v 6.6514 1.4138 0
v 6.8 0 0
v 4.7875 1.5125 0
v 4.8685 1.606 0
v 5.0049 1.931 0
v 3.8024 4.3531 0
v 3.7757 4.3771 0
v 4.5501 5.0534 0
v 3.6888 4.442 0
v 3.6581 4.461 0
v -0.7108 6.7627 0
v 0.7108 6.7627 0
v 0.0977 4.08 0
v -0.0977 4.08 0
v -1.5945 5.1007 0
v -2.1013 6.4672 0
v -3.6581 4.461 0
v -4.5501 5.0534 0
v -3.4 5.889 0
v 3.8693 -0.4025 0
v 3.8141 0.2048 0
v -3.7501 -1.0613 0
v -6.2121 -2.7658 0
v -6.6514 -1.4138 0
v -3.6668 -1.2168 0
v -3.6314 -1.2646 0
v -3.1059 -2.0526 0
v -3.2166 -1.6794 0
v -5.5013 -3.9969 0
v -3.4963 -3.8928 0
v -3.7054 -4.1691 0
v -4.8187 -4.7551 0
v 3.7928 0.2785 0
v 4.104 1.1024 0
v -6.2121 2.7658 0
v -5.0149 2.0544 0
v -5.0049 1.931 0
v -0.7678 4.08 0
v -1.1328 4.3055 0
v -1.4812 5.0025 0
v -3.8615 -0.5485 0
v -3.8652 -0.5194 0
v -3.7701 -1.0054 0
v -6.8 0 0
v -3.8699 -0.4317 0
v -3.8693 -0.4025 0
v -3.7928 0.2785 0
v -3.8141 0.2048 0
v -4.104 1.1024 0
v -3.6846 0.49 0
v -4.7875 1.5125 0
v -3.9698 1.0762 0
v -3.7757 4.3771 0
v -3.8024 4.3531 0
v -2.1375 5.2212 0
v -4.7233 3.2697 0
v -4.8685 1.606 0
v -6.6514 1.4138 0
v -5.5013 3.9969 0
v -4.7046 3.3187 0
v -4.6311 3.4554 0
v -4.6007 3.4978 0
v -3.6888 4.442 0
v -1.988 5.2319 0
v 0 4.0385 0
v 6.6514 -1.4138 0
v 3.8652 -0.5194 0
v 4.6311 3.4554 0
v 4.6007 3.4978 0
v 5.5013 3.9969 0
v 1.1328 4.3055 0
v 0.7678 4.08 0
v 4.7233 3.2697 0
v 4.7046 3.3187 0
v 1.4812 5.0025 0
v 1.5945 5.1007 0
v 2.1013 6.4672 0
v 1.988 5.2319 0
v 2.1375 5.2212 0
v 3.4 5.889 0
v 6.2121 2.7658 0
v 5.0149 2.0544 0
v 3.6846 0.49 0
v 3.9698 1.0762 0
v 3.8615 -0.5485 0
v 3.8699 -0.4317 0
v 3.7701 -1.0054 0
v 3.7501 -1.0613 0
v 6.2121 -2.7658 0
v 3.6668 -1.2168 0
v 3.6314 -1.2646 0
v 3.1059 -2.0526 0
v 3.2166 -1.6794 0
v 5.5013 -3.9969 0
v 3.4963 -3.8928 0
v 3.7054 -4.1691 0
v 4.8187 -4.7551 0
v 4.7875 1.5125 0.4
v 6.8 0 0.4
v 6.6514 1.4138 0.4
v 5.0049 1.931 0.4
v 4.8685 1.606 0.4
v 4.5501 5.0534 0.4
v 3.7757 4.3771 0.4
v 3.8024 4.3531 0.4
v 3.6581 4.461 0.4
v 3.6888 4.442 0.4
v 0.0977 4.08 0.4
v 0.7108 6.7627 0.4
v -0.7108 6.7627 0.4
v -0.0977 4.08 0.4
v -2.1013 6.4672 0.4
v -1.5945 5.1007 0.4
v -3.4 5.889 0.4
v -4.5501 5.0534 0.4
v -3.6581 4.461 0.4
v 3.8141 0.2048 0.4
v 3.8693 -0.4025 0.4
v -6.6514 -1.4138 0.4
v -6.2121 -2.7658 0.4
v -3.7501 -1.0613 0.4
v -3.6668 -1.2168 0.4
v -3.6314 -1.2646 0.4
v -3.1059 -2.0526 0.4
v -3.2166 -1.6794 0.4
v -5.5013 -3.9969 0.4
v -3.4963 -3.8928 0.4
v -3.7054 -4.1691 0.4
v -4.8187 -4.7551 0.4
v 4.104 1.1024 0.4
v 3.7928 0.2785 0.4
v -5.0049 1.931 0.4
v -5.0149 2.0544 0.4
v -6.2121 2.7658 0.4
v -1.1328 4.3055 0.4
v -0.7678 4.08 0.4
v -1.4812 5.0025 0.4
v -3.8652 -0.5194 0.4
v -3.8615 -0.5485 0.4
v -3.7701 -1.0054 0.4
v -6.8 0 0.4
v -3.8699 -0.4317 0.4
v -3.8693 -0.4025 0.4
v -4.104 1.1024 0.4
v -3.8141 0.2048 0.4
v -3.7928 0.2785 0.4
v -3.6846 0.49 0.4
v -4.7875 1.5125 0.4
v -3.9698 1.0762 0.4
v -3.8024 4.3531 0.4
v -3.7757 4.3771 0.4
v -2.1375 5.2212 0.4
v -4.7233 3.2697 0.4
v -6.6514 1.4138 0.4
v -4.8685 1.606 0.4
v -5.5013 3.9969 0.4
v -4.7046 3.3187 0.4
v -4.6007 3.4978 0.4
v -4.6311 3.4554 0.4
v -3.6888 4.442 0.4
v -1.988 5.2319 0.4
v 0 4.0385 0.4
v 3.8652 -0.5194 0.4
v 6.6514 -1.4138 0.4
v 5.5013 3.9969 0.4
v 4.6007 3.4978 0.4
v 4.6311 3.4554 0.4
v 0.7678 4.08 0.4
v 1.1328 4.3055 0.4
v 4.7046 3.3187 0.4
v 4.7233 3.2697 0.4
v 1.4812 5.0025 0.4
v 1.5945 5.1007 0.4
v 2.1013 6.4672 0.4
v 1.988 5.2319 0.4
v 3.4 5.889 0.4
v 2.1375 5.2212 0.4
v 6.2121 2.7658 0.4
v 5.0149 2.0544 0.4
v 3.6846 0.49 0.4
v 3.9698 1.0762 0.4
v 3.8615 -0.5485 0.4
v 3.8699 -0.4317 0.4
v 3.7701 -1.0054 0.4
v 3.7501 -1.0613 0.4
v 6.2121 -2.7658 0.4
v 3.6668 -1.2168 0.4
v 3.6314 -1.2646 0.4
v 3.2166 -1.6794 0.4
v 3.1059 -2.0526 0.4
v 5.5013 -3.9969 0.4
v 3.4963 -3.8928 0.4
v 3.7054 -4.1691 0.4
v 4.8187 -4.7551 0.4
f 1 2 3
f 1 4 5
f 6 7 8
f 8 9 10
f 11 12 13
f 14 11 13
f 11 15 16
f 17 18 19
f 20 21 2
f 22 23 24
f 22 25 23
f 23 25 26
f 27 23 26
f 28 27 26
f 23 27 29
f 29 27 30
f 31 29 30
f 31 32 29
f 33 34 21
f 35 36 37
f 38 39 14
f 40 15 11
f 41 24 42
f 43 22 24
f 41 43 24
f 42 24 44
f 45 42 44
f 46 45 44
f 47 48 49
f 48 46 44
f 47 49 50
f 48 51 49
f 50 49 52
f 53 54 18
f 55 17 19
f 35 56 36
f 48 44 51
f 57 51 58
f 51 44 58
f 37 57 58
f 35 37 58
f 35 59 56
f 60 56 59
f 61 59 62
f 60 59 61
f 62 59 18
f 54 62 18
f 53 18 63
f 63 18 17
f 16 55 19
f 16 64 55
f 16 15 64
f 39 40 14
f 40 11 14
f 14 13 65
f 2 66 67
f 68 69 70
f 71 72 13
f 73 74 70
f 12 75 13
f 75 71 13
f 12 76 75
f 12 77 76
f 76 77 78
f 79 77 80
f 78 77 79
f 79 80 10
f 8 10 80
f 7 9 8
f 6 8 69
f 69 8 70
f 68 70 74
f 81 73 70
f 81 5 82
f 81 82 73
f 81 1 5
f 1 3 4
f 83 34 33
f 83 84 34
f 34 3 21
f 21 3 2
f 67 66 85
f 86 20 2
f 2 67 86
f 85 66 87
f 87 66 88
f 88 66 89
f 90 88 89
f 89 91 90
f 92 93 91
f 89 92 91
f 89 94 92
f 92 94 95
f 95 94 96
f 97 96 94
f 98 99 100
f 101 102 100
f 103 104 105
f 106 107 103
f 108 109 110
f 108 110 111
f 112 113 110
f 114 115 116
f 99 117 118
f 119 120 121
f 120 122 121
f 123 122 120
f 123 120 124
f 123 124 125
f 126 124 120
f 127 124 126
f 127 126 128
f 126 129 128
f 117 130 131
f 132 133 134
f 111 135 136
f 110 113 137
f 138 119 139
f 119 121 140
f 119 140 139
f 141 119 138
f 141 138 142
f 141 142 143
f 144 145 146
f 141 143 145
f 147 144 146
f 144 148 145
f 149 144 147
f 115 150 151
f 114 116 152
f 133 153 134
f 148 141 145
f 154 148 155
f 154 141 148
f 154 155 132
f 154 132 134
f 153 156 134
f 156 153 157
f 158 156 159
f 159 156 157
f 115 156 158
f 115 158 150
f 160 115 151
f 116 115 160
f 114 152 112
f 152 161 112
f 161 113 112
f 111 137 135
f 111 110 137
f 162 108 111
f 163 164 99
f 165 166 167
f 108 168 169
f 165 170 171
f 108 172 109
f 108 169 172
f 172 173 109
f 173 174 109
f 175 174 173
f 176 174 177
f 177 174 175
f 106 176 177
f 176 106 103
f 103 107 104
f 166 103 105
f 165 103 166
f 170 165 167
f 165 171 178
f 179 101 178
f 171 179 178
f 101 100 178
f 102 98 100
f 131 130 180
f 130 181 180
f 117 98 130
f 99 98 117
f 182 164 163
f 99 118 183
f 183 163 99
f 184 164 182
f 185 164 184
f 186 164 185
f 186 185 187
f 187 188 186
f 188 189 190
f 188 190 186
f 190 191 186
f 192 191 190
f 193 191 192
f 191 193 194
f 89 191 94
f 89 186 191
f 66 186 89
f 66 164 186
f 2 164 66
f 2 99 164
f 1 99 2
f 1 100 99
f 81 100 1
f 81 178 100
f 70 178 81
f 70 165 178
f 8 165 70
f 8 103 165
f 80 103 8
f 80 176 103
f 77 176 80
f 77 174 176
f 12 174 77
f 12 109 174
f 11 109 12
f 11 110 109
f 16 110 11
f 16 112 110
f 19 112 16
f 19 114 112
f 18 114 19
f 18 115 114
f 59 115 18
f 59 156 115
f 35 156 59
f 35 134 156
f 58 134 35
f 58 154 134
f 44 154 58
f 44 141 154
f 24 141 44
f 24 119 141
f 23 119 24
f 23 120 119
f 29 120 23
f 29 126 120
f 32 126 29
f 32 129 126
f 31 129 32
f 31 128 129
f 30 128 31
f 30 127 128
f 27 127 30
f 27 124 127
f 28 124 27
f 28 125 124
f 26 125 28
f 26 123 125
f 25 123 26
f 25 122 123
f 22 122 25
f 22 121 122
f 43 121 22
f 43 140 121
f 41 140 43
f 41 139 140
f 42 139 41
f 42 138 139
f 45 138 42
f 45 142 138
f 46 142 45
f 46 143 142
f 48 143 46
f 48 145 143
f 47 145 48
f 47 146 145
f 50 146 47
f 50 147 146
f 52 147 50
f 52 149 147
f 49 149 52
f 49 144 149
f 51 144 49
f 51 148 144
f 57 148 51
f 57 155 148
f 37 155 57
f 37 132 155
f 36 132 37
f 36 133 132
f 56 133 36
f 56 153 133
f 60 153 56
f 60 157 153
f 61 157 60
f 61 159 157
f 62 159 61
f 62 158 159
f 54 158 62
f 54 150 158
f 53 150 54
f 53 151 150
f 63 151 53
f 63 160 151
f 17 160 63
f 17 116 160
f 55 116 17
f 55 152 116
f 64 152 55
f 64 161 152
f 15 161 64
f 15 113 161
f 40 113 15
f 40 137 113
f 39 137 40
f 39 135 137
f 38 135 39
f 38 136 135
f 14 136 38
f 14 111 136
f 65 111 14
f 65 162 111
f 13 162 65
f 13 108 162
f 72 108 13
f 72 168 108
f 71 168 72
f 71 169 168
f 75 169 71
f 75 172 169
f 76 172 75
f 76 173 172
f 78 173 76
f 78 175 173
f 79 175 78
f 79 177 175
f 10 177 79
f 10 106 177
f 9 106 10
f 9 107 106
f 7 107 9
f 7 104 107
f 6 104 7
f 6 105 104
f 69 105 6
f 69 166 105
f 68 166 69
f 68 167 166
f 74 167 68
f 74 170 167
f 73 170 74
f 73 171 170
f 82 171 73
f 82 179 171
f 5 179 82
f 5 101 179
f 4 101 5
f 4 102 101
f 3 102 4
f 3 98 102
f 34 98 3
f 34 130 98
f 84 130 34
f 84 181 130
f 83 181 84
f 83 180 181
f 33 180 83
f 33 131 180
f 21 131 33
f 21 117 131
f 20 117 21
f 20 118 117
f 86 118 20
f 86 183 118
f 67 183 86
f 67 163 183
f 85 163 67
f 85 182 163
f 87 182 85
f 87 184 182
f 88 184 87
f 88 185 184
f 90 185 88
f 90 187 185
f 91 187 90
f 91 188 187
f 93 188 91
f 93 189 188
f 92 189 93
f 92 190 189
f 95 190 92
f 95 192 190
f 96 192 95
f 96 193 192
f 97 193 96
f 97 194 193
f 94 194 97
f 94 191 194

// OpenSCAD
// file: ../lib/transforms.scad
use <functions.scad>

module fillet(r) {
  offset(r = -r) {
    offset(delta = r) {
      children();
    }
  }
}

// Generates the mirrored object in addition to the original one.
module mirror_copy(v = [1, 0, 0]) {
  children();
  mirror(v) {
    children();
  }
}

module translate_copy(v) {
  children();
  translate(v) {
    children();
  }
}

module rotate_copy(v) {
  children();
  translate(v) {
    children();
  }
}

module offset_3d(r=1, size=20, fn=12) {
  if (r == 0) {
    children();
  } else if (r > 0) {
    minkowski(convexity=5) {
      children();
      sphere(r, $fn=fn);
    }
  }
  else {
    size2 = size * [1, 1, 1];
    size1 = size2 * 2;

    difference() {
      cube(size2, center=true);
      minkowski(convexity=5) {
        difference() {
          cube(size1, center=true);
          children();
        }
        sphere(-r, $fn=fn);
      }
    }
  }
}

module offset_vertices_2d(r, fn) {
  offset(-r, $fn=fn) {
    offset(r, $fn=fn) {
      offset(r, $fn=fn) {
        offset(-r, $fn=fn) {
          children();
        }
      }
    }
  }
}

module four_corner_children(size=[10, 10],
                            center=true) {
  for (x_ind = [0, 1])
    for (y_ind = [0, 1]) {
      x_pos = (center ? -size[0] / 2 : 0) + x_ind * size[0];
      y_pos = (center ? -size[1] / 2 : 0) + y_ind * size[1];

      translate([x_pos, y_pos]) {
        $x_i = x_ind;
        $y_i = y_ind;
        children();
      }
    }
}

module four_corner_holes_2d(size=[10, 10],
                            center=false,
                            d=3,
                            fn=60) {
  for (x_ind = [0, 1])
    for (y_ind = [0, 1]) {
      x_pos = (center ? -size[0] / 2 : 0) + x_ind * size[0];
      y_pos = (center ? -size[1] / 2 : 0) + y_ind * size[1];
      translate([x_pos, y_pos]) {
        circle(r=d / 2, $fn=fn);
        children();
      }
    }
}

module maybe_rotate(rotation) {
  if (is_list(rotation) &&
      len([for (v = rotation) if (is_num(v)) v]) == 3 &&
      len([for (v = rotation) if (v != 0) v]) > 0) {
    rotate(rotation) {
      children();
    }
  } else {
    children();
  }
}

module maybe_translate(v) {
  if (is_list(v)
      && len([for (n = v) if (is_num(n)) n]) == 3
      && len([for (n = v) if (n != 0) n]) > 0) {
    translate(v) {
      children();
    }
  } else {
    children();
  }
}

module spin_keep_bbox_at_origin(size, a) {
  if (is_undef(a) || a == 0) {
    children();
  } else {
    p = calc_rotated_bbox(size[0], size[1], a);
    translate([p[2], p[3], 0]) {
      rotate([0, 0, a]) {
        children();
      }
    }
  }
}

module align_children(parent_size,
                      size,
                      align_x=-1,
                      align_y=-1) {
  if (!is_list(parent_size)
      || !is_num(parent_size[0])
      || !is_num(parent_size[1])) {
    children();
  } else {
    cell_x = parent_size[0];
    cell_y = parent_size[1];
    full_x = size[0];
    full_y = size[1];

    dx = cell_x - full_x;
    dy = cell_y - full_y;

    x = align_x == -1
      ? 0
      : align_x == 0
      ? dx / 2
      : dx;

    y = align_y == 0
      ? dy / 2
      : align_y == 1
      ? dy
      : 0;

    translate([x, y, 0]) {
      children();
    }
  }
}

/**
 ─────────────────────────────────────────────────────────────────────────────
 align_children_with_spin
 ─────────────────────────────────────────────────────────────────────────────

 **Example**:
 ```scad

 module example(angle=16,
                l=15,
                thickness=3,
                w=3) {
  bbox = rot_x_bbox_align([thickness, l, w,], angle=angle);
  bbox_y = bbox[0];
  bbox_z = bbox[1];

  #cube([bbox_y, bbox_z, thickness]);
  align_children_with_spin(parent_size=[l, w, thickness],
                           size=[l, w, thickness],
                           spin=-angle,
                           align_x=-1,
                           align_y=-1) {
    cube([l, w, thickness]);
  }
}

 ```
*/
module align_children_with_spin(parent_size,
                                size,
                                align_x=-1,
                                align_y=-1,
                                spin=0) {
  if (!is_undef(spin) && spin != 0) {
    let (params = calc_rotated_bbox(size[0], size[1],
                                    spin),
         full_x = params[0],
         full_y = params[1],
         sx = params[2],
         sy = params[3]) {
      align_children(parent_size=parent_size,
                     size=[full_x, full_y],
                     align_x=align_x,
                     align_y=align_y) {
        translate([sx, sy, 0]) {
          rotate([0, 0, spin]) {
            children();
          }
        }
      }
    }
  } else {
    align_children(parent_size=parent_size,
                   size=size,
                   align_x=align_x,
                   align_y=align_y) {
      children();
    }
  }
}

module maybe_color(color, alpha=1) {
  if (is_undef(color)) {
    children();
  } else {
    color(color, alpha=alpha) {
      children();
    }
  }
}

module rotate_children_with_shift(size=[0, 0, 0],
                                  angles=[0, 0, 0],
                                  show_bbox=false) {
  bb = rotated_bbox(size, angles);
  x_shift = bb[3];
  y_shift = bb[4];
  z_shift = bb[5];
  translate([x_shift, y_shift, z_shift]) {
    rotate(angles) {
      children();
    }
  }
  if (show_bbox) {
    #cube([bb[0], bb[1], bb[2]]);
  }
}
// file: ../lib/debug.scad
/**
 * Module: Debug utilities
 *
 * Author: Karim Aziiev <karim.aziiev@gmail.com>
 * License: GPL-3.0-or-later
 */
include <../colors.scad>

use <transforms.scad>

module debug_polygon_text(points,
                          font_size=3.0,
                          color=green_1,
                          circle_color=yellow_3,
                          circle_r=0.3,
                          offset_x,
                          offset_y,
                          rotation,
                          h=0.5) {
  offset_x = is_undef(offset_x) ? 0 : offset_x;
  offset_y = is_undef(offset_y) ? 0 : offset_y;
  has_h = is_num(h);

  module _circle(r=circle_r) {
    if (has_h) {
      linear_extrude(height=h - 0.01, center=false) {
        circle(r=r, $fn=20);
      }
    } else {
      circle(r=r, $fn=20);
    }
  }
  for (i = [0 : len(points) - 1]) {
    let (pt = points[i],
         p0 = pt[0] + offset_x,
         p1 = pt[1] + offset_y) {
      color(color) {
        translate([p0, p1, 0.1]) {
          maybe_rotate(rotation) {
            if (has_h) {
              linear_extrude(height = 0.5) {
                text(str(i),
                     size = font_size,
                     valign="center",
                     halign="center");
              }
            } else {
              text(str(i), size = font_size, valign="center", halign="center");
            }
          }
        }
      }

      color(circle_color) {
        translate([pt[0], pt[1]]) {
          _circle();
        }
        if (p0 != pt[0] || p1 != pt[1]) {
          hull() {
            translate([pt[0], pt[1]]) {
              _circle(r=0.1);
            }
            translate([p0, p1]) {
              _circle(r=0.1);
            }
          }
        }
      }
    }
  }
}

module debug_polygon_arrows(points,
                            paths=undef,
                            arrow_size=1) {
  all_paths = paths == undef ?
    [[for (i = [0 : len(points)-1]) i]] : paths;

  for (path = all_paths)
    for (i = [0 : len(path) - 1]) {
      a = points[path[i]];
      b = points[path[(i + 1) % len(path)]];

      dx = b[0] - a[0];
      dy = b[1] - a[1];
      angle = atan2(dy, dx);
      mid = [(a[0] + b[0]) / 2, (a[1] + b[1]) / 2];

      color("green") {
        translate([mid[0], mid[1], 0.1]) {
          rotate([0, 0, angle]) {
            linear_extrude(height = 0.5) {
              polygon(points=[[0, 0],
                              [arrow_size, arrow_size / 2],
                              [arrow_size, -arrow_size / 2]]);
            }
          }
        }
      }
    }
}

module debug_polygon(points,
                     paths=undef,
                     convexity=undef,
                     debug=true,
                     arrow_size=1,
                     font_size=3.0,
                     color=green_2,
                     show_arrows=false) {
  polygon(points=points, paths=paths, convexity=convexity);

  if (debug) {
    debug_polygon_text(points=points,
                       font_size=font_size,
                       color=color);
    if (show_arrows) {
      debug_polygon_arrows(points=points,
                           paths=paths,
                           arrow_size=arrow_size);
    }
  }
}

module debug_highlight(debug=false) {
  if (debug) {
    #children();
  } else {
    children();
  }
}

module bounding_box(excess=0, planar=false) {
  module _xProjection() {
    if (planar) {
      projection()
        rotate([90, 0, 0]) {
        linear_extrude(1, center=true) {
          hull() {
            children();
          }
        }
      }
    } else {
      xs = excess < .1 ? 1: excess;
      linear_extrude(xs, center=true)
        projection() {
        rotate([90, 0, 0]) {
          linear_extrude(xs, center=true) {
            projection() {
              hull() {
                children();
              }
            }
          }
        }
      }
    }
  }

  // a bounding box with an offset of 1 in all axis
  module _oversize_bbox() {
    if (planar) {
      minkowski() {
        _xProjection() {
          children(); // x axis
        }
        rotate(-90) {
          _xProjection() {
            rotate(90) {
              children(); // y axis
            }
          }
        }
      }
    } else {
      minkowski() {
        _xProjection() {
          children(); // x axis
        }
        rotate(-90) {
          _xProjection() {
            rotate(90) {
              children(); // y axis
            }
          }
        }
        rotate([0,-90, 0]) {
          _xProjection() {
            rotate([0, 90, 0]) {
              children(); // z axis
            }
          }
        }
      }
    }
  }

  // offsets a cube by `excess`
  module _shrink_cube() {
    intersection() {
      translate((1-excess)*[1, 1, 1]) {
        children();
      }
      translate((1-excess)*[-1,-1,-1]) {
        children();
      }
    }
  }

  if (planar) {
    offset(excess-1/2) {
      _oversize_bbox() {
        children();
      }
    }
  } else {
    render(convexity=2)
      if (excess>.1) {
        _oversize_bbox() {
          children();
        }
      } else {
        _shrink_cube() {
          _oversize_bbox() {
            children();
          }
        }
      }
  }
}

// // Example(3D):
// module shapes() {
//   translate([10, 8, 4]) cube(5);
// }
// #bounding_box() {
//   shapes();
// }
// shapes();

// module shapes_2d() {
//   translate([10, 8]) square(5);
//   translate([3, 0]) square(2);
// }

// translate([-20, 0, 0]) {
//   #bounding_box(planar=true) {
//     shapes_2d();
//   }
// }
// file: ../colors.scad
blue_grey_carbon         = "#293542";
black_1                  = "#191919";
onyx                     = "#353935";
matte_black              = "#28282B";
matte_black_2            = "#1A1818";
jet_black                = "#343434";
midnight_blue            = "#191970";
licorice                 = "#1B1212";
metallic_blue_1          = "#4F738E";
metallic_silver_1        = "#C0C0C0";
metallic_silver_2        = "#999B9B";
metallic_silver_3        = "#7D8488";
metallic_silver_4        = "#5F6367";
metallic_silver_5        = "#dfdfdf";
metallic_silver_6        = "#e7dfd6";
metallic_silver_7        = "#e5e0d5";
metallic_silver_8        = "#dbd6cb";
metallic_silver_9        = "#acacac";

cobalt_blue_metallic     = "#39699E";
// Lighter tints (mixed with white)
cobalt_blue_light_1      = "#5079A8";
cobalt_blue_light_2      = "#6799C2";
cobalt_blue_light_3      = "#93B8D6";

// Darker shades (mixed with black)
cobalt_blue_dark_1       = "#2D547E";
cobalt_blue_dark_2       = "#223F5F";
cobalt_blue_dark_3       = "#162A3F";

metallic_grey            = "#808080";
metallic_yellow_silver   = "#D4D4C8";
metallic_yellow_silver_2 = "#eee5c7";

yellow_1                 = "#ffde1a";
yellow_2                 = "#cdc069";
yellow_3                 = "#f6bf2d";
metallic_yellow_1        = "#FDCC0D";
metallic_gold_2          = "#C8A145";

light_grey               = "#e6e6e6";

dark_gold_1              = "#B59410";
dark_gold_2              = "#b8860b";

green_1                  = "#6CC04A";
green_2                  = "#1da760";
green_3                  = "#037739";
green_4                  = "#00B174";

ir_1                     = "#f7d7ff"; // infrared

noir_1                   = "#2a353b";

medium_blue_1            = "#0a4d8d";
medium_blue_2            = "#004CB1";

brown_1                  = "#977354";
brown_2                  = "#bb9477";
brown_3                  = "#7a4d48";

red_1                    = "#df1d29";
red_2                    = "#D63A20";

white_smoke_1            = "#f5f5f5";
white_off_1              = "#F2F0EF";
white_snow_1             = "#FFFAFA";
// main file
/**
  * Module: E-clip placeholder
  *
  * Author: Karim Aziiev <karim.aziiev@gmail.com>
  * License: GPL-3.0-or-later
  */

include <../colors.scad>

use <../lib/debug.scad>
use <../lib/transforms.scad>

module e_clip(shaft_d,
              color=matte_black,
              clip_radial = undef,
              thickness=0.4,
              fn,
              debug=false) {

  fn = is_undef(fn) ? ($preview ? 20 : 30) : fn;

  tr = is_undef(clip_radial) ? shaft_d * 0.18 : clip_radial;

  outer_r = shaft_d / 2 + tr;

  d = outer_r * 2;
  r = d / 2;

  round_r = r * 0.06;

  x1 = r * 0.45;
  y1 = r * 0.27;

  pts = [[-r * 0.9, -r * 0.8],
         [-r * 0.52, -r * 0.6],
         [-x1, -y1],
         [-x1 - r * 0.1, -y1 + r * 0.1],
         [-x1 - r * 0.12, -y1 + r * 0.2],
         [-x1 - r * 0.1, r * 0.15],
         [-x1, r * 0.07],
         [-r * 0.75, r * 0.25],
         [-r * 0.69, r * 0.5],
         [-r * 0.55, r * 0.65],
         [-r * 0.15, r * 0.85],
         [-r * 0.25, r * 0.8],
         [-r * 0.15, r * 0.6],
         [round_r, r * 0.6],
         [0, -r * 1.1]];

  color(color) {
    linear_extrude(height=thickness, center=false) {
      difference() {
        circle(r=d / 2, $fn=fn);
        mirror_copy([1, 0, 0]) {
          offset_vertices_2d(r=round_r) {
            polygon(pts);
          }
        }
      }
    }
  }
  if (debug) {
    translate([0, 0, thickness]) {
      debug_polygon_text(pts, font_size=r * 0.1, circle_r=r * 0.02);
    }
  }
}

e_clip(shaft_d=10, debug=false);
